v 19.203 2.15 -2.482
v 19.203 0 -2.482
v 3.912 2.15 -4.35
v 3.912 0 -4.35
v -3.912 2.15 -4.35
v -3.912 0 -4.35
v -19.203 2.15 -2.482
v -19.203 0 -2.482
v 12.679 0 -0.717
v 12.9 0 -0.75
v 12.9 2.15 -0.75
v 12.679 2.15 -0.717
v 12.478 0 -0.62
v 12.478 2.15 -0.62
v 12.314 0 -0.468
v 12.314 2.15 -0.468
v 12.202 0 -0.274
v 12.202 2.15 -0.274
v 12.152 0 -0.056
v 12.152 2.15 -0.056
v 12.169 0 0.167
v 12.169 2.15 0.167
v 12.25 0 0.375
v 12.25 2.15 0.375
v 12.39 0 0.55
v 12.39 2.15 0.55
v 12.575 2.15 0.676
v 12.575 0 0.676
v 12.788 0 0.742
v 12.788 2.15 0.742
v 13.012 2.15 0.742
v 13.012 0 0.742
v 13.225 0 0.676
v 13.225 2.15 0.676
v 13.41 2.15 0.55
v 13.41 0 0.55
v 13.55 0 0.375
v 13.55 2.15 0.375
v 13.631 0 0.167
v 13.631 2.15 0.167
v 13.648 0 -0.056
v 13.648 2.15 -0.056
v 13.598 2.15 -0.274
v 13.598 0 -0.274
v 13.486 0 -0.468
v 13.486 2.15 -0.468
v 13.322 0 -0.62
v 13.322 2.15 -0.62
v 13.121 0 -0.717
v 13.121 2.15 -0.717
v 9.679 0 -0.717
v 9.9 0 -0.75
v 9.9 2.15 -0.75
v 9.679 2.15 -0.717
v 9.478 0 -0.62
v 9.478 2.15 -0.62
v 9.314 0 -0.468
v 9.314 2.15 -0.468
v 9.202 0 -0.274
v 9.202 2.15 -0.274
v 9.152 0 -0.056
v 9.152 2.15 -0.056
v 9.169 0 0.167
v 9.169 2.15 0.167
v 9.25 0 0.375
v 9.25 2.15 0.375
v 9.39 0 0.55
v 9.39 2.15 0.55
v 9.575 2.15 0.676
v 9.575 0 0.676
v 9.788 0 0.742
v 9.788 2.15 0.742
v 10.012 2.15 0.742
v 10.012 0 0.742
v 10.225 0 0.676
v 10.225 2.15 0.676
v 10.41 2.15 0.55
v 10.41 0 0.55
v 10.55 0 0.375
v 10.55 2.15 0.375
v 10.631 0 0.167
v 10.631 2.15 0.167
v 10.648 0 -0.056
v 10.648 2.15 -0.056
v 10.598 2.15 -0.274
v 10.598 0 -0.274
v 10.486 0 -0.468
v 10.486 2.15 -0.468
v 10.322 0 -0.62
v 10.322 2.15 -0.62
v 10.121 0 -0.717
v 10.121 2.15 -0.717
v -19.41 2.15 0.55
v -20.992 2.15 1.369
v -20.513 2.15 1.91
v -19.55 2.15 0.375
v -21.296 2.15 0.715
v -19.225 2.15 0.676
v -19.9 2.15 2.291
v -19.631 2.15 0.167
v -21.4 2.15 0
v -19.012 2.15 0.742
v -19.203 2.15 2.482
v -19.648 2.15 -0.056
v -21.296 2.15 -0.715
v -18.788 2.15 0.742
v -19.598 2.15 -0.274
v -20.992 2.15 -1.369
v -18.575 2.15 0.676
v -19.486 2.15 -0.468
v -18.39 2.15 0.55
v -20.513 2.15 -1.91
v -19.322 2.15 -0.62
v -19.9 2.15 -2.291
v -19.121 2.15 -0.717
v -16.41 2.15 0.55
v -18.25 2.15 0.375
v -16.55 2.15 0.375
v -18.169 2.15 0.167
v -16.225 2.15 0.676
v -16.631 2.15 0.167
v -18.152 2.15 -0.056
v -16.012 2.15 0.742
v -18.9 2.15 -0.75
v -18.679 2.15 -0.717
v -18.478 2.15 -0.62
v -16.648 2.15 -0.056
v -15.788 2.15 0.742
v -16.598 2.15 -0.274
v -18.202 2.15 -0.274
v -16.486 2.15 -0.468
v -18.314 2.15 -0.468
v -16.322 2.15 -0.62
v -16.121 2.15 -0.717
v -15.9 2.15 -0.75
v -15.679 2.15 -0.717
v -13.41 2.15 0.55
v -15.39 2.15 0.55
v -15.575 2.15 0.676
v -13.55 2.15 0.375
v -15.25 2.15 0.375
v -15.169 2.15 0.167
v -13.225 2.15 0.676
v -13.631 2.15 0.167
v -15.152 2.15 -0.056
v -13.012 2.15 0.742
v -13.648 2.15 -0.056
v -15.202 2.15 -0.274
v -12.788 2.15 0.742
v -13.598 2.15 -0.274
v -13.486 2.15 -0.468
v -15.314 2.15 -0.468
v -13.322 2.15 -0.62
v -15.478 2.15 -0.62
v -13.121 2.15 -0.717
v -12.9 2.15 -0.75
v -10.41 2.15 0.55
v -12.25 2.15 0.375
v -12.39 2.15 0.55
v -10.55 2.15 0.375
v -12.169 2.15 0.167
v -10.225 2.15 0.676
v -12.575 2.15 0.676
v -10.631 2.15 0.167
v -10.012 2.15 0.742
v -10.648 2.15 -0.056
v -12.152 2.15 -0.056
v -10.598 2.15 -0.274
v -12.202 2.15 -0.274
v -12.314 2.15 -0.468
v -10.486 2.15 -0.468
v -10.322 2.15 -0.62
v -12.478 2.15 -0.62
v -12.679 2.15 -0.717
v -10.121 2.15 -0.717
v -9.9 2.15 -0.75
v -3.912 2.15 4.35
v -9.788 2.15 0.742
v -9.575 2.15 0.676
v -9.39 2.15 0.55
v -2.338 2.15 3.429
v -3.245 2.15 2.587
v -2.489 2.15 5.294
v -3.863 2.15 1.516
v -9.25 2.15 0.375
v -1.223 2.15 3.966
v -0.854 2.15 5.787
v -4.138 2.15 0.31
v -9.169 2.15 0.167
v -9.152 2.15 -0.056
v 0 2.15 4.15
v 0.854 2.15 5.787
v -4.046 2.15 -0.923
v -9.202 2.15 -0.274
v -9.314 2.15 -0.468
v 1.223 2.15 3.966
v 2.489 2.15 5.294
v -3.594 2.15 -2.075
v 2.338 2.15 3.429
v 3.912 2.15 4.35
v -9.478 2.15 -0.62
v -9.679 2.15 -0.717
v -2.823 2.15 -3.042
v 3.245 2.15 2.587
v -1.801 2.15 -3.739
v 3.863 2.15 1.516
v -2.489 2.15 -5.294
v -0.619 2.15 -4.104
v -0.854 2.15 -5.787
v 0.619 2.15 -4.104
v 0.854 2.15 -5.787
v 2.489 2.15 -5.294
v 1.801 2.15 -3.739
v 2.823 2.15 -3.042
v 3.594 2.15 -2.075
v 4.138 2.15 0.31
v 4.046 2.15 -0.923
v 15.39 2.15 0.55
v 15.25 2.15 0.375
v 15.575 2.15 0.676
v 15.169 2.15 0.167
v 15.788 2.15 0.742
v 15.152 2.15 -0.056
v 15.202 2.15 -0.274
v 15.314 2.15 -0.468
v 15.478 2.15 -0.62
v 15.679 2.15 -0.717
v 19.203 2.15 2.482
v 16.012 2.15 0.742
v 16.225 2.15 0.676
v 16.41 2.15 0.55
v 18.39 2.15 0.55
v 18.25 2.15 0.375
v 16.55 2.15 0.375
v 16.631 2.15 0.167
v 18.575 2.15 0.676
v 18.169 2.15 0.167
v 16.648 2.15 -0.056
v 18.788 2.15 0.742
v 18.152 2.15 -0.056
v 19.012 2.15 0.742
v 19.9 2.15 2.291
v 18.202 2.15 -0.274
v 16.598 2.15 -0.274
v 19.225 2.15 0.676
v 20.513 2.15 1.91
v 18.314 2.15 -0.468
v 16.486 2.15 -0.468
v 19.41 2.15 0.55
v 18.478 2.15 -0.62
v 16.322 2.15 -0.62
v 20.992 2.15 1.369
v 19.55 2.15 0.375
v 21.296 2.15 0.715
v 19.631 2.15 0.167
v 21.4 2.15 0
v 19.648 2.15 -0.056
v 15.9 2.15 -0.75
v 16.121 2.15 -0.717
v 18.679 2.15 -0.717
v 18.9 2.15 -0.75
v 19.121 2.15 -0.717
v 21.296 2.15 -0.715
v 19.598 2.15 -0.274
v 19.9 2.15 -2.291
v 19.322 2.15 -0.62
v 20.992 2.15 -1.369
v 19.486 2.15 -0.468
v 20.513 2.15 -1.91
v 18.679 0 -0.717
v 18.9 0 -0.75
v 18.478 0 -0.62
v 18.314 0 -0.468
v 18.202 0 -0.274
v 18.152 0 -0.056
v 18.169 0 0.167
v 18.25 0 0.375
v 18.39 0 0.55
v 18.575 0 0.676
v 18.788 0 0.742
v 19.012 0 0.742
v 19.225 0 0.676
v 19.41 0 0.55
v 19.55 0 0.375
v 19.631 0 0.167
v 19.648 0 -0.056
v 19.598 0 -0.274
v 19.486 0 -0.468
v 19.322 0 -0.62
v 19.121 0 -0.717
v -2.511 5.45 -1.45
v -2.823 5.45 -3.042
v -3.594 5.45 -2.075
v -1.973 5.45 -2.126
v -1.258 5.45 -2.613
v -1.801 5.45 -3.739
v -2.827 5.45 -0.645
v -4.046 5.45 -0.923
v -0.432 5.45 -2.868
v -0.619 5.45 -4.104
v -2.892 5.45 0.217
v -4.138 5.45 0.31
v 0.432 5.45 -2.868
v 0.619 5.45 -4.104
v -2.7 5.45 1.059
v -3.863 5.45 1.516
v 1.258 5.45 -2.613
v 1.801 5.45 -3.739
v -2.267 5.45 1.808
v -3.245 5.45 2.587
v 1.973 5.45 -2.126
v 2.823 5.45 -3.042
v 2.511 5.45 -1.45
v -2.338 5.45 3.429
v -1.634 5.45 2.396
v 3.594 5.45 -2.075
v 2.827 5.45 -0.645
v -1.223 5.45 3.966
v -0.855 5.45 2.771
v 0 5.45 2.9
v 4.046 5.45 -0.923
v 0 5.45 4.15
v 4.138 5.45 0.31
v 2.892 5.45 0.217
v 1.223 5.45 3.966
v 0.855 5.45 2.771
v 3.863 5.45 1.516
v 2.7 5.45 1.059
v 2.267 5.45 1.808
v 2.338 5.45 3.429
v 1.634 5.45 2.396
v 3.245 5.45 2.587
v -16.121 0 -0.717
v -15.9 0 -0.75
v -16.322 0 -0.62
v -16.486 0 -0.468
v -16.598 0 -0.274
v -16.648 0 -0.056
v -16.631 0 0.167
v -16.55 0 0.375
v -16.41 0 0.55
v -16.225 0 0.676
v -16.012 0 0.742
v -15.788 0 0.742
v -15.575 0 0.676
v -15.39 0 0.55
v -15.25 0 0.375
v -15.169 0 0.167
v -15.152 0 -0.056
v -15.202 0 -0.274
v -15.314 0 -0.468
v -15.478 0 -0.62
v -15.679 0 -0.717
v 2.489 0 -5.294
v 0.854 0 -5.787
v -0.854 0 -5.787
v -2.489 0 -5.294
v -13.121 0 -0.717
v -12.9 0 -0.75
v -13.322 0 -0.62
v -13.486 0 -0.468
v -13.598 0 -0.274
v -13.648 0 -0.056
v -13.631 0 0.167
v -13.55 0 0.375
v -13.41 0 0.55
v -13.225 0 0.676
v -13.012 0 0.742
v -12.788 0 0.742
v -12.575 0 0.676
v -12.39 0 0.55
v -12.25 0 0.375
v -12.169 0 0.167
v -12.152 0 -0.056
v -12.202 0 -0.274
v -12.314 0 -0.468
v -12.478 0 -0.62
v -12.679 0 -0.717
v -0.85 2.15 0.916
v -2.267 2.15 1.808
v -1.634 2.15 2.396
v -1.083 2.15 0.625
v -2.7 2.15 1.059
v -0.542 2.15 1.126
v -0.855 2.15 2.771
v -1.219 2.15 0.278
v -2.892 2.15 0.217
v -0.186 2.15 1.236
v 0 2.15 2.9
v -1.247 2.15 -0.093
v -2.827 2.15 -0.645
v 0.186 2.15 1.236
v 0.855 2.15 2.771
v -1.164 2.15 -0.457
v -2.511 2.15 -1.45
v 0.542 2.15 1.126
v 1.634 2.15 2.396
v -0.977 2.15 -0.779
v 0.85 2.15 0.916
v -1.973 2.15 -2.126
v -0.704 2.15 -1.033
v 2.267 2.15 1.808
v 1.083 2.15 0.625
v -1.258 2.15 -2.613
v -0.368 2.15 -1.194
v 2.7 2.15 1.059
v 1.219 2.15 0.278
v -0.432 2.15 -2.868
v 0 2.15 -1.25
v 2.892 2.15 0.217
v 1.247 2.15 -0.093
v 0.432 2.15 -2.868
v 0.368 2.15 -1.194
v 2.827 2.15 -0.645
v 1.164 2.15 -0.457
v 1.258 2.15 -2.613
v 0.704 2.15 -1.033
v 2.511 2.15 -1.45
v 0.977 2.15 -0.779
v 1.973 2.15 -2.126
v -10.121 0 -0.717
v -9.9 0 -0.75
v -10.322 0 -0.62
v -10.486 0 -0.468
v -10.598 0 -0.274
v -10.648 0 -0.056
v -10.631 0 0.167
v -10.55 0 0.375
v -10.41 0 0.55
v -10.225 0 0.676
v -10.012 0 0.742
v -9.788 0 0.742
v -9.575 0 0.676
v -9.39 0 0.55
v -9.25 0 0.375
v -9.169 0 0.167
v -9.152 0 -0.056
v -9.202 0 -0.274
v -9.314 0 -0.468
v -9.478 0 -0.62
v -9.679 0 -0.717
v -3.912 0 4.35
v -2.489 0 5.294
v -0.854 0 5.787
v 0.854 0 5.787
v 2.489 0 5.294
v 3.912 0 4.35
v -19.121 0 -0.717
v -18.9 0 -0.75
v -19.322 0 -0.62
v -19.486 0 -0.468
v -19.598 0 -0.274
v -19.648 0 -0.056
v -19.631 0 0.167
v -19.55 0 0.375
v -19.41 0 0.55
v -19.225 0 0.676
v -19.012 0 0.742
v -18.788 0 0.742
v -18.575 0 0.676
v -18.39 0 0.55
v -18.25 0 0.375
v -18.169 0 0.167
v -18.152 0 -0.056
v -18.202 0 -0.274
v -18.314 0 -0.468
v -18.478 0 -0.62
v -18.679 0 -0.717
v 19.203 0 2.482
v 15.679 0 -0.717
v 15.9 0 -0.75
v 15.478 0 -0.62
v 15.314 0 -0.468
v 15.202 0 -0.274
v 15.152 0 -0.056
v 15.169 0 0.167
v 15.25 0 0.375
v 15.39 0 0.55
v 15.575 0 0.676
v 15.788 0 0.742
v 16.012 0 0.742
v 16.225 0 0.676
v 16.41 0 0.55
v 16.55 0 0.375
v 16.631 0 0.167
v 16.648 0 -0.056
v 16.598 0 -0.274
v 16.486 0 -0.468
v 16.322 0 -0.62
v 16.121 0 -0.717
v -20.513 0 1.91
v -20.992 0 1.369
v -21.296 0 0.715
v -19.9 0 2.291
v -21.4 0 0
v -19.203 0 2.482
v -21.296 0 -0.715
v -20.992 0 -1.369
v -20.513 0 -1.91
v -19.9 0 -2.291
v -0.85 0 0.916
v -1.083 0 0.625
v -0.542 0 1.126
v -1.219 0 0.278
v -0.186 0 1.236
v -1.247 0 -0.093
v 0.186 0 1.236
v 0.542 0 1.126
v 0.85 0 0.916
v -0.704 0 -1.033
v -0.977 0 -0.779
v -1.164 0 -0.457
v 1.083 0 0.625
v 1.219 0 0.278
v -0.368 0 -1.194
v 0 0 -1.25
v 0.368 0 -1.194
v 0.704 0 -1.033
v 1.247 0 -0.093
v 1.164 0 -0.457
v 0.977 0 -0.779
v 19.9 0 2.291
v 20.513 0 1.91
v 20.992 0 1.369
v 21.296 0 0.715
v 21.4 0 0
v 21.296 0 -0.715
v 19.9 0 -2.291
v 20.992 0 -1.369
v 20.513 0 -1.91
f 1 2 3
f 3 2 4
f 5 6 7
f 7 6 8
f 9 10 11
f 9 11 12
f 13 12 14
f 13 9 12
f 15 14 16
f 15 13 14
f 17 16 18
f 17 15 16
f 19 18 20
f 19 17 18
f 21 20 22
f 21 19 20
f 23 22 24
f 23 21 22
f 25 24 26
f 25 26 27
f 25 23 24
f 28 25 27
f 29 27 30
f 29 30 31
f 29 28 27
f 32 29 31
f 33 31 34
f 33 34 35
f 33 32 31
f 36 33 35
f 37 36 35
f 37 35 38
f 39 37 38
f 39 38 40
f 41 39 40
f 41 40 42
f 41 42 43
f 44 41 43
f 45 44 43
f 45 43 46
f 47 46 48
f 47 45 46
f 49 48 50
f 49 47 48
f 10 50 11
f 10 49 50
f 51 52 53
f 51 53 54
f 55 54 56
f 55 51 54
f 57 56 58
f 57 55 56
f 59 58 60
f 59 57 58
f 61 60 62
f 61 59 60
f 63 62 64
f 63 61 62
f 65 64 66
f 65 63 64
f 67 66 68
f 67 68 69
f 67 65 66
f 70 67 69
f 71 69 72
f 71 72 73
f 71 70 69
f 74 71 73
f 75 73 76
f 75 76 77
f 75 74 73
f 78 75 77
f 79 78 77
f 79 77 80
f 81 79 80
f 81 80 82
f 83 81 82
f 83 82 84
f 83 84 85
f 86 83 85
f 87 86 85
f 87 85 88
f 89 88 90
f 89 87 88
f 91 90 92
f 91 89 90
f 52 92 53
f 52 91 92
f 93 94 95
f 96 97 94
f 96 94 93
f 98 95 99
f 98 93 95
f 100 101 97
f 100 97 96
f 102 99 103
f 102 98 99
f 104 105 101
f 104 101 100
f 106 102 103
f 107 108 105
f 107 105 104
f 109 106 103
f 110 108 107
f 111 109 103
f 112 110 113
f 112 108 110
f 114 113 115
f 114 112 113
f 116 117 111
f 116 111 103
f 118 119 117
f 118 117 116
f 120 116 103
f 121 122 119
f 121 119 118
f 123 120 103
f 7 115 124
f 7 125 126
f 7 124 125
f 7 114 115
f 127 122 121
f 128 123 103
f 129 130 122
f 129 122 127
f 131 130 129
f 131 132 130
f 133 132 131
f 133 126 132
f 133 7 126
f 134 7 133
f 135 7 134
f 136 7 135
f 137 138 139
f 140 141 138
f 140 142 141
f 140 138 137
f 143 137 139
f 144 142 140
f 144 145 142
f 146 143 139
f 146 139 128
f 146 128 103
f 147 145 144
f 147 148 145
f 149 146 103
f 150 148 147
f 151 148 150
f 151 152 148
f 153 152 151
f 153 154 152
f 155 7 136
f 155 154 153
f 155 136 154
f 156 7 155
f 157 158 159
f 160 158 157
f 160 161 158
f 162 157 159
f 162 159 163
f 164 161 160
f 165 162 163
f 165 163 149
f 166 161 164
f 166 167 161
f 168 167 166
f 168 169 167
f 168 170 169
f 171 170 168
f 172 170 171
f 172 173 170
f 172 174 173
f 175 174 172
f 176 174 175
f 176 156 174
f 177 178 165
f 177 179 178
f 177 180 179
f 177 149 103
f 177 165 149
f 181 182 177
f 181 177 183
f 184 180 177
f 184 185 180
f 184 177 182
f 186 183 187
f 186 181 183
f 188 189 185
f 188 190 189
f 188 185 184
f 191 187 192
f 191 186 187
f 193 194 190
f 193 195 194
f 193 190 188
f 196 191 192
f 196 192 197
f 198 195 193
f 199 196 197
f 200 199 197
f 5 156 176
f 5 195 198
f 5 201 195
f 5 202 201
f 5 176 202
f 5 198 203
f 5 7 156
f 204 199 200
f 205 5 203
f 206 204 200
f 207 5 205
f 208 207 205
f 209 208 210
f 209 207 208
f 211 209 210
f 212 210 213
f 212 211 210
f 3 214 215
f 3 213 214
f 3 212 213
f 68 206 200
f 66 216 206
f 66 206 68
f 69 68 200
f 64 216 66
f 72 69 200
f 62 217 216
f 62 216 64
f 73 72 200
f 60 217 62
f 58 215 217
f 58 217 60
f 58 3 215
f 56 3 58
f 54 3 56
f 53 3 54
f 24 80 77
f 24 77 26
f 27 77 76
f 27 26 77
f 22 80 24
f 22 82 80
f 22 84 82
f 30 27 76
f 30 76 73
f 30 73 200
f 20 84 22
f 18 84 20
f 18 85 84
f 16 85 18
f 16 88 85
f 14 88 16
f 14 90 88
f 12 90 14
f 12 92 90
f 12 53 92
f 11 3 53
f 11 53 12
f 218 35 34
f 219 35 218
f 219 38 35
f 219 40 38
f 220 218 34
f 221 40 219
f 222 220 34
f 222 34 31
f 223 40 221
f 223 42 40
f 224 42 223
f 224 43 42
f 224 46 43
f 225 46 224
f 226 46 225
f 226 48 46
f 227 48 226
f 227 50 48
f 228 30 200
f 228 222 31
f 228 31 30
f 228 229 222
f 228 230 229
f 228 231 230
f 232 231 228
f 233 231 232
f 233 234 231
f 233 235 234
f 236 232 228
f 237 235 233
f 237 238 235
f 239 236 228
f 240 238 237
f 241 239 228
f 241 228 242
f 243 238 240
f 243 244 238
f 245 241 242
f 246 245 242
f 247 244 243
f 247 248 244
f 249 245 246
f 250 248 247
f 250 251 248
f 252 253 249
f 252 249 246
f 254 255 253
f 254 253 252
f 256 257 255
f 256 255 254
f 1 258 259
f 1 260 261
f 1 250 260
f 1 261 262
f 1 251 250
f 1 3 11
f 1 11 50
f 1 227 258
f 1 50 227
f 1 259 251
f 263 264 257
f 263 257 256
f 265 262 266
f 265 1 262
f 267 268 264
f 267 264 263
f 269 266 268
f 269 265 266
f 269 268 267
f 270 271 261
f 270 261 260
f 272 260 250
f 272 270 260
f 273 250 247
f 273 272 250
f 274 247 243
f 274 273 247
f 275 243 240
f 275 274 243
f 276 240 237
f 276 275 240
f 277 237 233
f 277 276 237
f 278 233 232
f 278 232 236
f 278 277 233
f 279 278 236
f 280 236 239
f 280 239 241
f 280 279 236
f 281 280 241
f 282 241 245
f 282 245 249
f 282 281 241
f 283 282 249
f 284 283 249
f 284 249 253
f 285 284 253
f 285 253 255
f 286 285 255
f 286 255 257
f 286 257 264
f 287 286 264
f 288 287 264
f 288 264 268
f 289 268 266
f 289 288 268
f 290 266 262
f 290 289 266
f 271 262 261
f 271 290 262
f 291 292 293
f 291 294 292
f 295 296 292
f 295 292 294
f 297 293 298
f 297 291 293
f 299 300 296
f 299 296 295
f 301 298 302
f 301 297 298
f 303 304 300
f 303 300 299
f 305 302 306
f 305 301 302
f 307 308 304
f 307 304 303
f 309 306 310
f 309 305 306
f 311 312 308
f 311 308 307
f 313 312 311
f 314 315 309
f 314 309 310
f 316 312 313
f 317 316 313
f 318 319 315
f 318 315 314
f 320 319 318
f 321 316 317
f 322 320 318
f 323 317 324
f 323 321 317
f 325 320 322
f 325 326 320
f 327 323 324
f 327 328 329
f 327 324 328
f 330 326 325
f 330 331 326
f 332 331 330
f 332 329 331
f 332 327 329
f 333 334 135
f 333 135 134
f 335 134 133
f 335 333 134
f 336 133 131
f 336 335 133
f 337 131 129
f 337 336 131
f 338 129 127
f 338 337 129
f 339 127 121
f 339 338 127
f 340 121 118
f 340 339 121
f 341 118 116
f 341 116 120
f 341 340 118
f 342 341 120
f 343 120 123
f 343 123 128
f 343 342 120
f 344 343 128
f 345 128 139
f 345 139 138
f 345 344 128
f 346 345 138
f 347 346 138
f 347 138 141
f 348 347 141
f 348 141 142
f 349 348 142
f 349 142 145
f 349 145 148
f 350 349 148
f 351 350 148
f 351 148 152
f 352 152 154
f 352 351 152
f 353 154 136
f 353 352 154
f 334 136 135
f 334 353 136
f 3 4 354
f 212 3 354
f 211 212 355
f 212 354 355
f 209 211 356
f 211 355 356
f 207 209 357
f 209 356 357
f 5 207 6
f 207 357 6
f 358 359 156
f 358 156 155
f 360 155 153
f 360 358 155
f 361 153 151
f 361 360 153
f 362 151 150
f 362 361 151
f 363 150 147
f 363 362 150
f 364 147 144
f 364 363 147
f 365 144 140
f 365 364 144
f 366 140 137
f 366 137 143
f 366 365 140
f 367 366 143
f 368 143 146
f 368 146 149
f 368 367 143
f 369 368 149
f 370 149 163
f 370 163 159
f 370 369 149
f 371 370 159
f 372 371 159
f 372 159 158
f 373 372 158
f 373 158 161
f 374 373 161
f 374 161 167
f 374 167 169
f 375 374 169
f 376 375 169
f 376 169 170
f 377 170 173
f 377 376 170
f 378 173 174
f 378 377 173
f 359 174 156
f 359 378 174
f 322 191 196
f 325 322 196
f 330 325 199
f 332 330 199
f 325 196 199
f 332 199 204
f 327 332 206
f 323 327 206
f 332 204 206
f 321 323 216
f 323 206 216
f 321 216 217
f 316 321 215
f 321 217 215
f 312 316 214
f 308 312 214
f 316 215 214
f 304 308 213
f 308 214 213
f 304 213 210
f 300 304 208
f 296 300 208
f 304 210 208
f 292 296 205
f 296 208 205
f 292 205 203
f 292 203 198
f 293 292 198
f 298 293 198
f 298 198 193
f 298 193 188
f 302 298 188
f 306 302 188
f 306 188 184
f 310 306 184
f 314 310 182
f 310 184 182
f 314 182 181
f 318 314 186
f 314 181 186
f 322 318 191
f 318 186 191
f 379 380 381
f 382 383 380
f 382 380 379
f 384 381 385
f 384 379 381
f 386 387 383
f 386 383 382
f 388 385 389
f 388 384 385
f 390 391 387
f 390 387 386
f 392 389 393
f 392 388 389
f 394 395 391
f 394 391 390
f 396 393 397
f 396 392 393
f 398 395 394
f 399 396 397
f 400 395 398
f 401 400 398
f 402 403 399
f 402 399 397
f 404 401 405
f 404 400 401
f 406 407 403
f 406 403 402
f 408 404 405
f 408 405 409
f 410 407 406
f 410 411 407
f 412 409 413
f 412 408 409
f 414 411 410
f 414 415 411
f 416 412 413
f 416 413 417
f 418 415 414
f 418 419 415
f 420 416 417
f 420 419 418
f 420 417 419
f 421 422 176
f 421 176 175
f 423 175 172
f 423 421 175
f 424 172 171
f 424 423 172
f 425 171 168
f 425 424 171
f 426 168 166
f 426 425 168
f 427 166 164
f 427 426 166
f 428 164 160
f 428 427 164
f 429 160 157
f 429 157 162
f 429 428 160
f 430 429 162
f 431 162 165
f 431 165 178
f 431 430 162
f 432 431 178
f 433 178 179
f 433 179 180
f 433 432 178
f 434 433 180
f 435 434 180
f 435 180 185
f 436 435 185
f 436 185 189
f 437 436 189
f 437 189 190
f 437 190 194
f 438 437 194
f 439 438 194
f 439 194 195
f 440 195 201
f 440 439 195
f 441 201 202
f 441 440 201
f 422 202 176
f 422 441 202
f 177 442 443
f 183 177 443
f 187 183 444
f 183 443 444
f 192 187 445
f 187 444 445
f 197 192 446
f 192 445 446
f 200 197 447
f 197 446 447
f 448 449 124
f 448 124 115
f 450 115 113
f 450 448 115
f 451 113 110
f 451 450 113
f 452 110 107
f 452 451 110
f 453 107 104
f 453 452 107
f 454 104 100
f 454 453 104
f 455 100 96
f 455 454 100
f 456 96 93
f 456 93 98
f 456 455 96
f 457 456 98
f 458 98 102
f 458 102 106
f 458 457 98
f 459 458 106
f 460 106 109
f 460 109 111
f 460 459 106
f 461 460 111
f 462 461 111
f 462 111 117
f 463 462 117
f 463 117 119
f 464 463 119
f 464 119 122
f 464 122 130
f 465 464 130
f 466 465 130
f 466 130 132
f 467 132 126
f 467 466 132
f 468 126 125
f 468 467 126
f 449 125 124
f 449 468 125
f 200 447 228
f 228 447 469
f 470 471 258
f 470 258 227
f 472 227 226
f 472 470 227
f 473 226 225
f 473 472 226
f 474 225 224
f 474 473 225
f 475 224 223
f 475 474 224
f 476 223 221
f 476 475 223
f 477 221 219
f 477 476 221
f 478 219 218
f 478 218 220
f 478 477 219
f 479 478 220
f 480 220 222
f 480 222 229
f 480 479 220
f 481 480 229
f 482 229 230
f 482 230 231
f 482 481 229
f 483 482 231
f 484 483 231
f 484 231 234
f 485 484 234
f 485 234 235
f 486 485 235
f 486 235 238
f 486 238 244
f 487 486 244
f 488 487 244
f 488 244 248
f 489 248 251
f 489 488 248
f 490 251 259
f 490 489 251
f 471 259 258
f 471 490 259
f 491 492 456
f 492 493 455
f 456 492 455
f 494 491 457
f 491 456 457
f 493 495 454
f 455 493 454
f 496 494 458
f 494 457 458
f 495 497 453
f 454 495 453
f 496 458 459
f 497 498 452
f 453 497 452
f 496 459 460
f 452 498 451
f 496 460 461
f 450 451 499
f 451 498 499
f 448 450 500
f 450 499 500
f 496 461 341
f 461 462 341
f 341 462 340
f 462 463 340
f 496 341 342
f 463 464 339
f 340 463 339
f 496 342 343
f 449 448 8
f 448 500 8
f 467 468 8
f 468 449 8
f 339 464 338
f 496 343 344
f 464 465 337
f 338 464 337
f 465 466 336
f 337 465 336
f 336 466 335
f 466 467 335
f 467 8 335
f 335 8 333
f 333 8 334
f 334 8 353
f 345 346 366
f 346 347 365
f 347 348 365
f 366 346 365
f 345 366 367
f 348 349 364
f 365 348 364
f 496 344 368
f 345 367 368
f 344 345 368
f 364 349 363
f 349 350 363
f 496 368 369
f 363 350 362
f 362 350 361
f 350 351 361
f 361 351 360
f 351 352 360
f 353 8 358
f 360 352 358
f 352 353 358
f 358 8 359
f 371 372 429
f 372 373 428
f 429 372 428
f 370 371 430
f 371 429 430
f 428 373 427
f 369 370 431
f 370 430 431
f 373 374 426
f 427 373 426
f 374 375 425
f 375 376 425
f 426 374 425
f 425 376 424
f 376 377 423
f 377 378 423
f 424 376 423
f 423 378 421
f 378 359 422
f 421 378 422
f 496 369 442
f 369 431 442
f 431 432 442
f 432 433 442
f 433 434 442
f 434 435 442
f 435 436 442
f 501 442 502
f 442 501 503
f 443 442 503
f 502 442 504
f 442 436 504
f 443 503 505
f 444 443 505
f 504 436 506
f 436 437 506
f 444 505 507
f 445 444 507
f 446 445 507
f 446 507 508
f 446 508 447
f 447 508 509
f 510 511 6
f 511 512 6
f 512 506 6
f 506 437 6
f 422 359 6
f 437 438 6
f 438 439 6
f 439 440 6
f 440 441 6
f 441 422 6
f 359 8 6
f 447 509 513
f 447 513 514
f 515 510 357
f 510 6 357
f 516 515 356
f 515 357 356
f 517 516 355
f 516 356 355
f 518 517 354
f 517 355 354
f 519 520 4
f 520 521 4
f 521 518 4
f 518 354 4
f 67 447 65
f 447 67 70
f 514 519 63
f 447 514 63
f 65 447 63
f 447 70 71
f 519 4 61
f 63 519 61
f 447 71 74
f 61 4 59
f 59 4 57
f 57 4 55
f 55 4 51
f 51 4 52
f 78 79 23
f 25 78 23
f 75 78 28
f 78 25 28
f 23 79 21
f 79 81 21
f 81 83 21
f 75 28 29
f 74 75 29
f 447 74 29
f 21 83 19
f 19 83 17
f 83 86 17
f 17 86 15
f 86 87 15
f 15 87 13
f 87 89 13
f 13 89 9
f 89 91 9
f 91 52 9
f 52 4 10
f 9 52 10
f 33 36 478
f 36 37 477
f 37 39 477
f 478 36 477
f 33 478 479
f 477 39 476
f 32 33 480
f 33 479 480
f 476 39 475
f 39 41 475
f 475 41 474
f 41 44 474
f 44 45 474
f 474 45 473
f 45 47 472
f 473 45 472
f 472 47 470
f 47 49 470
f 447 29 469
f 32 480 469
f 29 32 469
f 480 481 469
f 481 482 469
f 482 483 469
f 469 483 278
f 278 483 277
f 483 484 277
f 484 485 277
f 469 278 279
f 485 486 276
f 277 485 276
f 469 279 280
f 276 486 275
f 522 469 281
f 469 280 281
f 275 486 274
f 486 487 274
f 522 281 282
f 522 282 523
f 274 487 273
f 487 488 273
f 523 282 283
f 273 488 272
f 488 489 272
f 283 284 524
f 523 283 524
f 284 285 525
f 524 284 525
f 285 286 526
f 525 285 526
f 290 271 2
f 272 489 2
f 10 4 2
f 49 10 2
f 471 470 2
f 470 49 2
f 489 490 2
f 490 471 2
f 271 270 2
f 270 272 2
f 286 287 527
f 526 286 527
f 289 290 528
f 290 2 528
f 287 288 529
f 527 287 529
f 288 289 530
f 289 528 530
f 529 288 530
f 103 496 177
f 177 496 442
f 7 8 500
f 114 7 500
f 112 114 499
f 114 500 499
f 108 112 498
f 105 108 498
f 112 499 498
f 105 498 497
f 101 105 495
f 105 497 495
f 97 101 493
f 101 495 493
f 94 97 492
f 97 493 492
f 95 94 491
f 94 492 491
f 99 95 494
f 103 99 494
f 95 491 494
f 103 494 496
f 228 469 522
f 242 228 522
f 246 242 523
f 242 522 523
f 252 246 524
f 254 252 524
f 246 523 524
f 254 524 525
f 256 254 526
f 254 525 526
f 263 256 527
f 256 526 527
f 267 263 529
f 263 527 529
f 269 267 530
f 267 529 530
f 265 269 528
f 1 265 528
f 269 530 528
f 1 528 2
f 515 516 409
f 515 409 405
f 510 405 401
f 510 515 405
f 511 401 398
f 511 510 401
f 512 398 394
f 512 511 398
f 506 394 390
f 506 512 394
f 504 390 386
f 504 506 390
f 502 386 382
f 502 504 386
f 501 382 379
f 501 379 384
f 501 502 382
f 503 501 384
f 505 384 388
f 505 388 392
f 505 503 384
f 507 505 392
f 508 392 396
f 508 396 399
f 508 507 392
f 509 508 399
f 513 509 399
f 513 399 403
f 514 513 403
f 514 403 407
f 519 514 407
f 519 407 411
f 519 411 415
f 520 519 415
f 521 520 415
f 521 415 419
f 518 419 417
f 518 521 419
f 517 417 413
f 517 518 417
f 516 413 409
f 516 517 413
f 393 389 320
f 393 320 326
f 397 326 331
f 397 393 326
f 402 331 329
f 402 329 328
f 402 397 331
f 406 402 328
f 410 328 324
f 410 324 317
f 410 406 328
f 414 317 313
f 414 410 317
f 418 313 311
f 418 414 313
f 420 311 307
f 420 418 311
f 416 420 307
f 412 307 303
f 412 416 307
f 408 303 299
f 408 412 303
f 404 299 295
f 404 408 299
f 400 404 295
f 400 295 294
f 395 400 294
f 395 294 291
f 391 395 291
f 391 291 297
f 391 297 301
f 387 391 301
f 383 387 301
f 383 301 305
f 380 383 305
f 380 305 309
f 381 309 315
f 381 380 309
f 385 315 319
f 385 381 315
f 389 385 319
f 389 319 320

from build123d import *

# Parameters (mm, degrees)
SKETCH1_R           = 5.85
SKETCH1_R_2         = 1.25
SKETCH1_R_3         = 0.75
BOSS_EXTRUDE1_DEPTH = 2.15
SKETCH2_R           = 4.15
SKETCH2_R_2         = 2.9
BOSS_EXTRUDE2_DEPTH = 3.3


with BuildPart() as part:
    # Sketch1 → Boss-Extrude1 (new body)
    # profile 1 of 3: a face of its own
    with BuildSketch(Plane(origin=(0, 0, 0), x_dir=(1, 0, 0), z_dir=(0, 1, 0))):
        Circle(SKETCH1_R)
        with Locations(Location((0, 0, 0), (0, 0, 90))):
            Circle(SKETCH1_R_2, mode=Mode.SUBTRACT)
    # profile 2 of 3: a face of its own
    with BuildSketch(Plane(origin=(0, 0, 0), x_dir=(1, 0, 0), z_dir=(0, 1, 0))):
        with BuildLine():
            Line((-3.911521443, 4.35), (-19.203214028, 2.481544127))
            ThreePointArc((-19.203214028, 2.481544127), (-21.4, 0), (-19.203214028, -2.481544127))
            Line((-19.203214028, -2.481544127), (-3.911521443, -4.35))
            ThreePointArc((-3.911521443, -4.35), (-5.85, 0), (-3.911521443, 4.35))
        make_face()
        with Locations(Location((-18.9, 0, 0), (0, 0, 90))):
            Circle(SKETCH1_R_3, mode=Mode.SUBTRACT)
        with Locations(Location((-15.9, 0, 0), (0, 0, 90))):
            Circle(SKETCH1_R_3, mode=Mode.SUBTRACT)
        with Locations(Location((-12.9, 0, 0), (0, 0, 90))):
            Circle(SKETCH1_R_3, mode=Mode.SUBTRACT)
        with Locations(Location((-9.9, 0, 0), (0, 0, 90))):
            Circle(SKETCH1_R_3, mode=Mode.SUBTRACT)
    # profile 3 of 3: a face of its own
    with BuildSketch(Plane(origin=(0, 0, 0), x_dir=(1, 0, 0), z_dir=(0, 1, 0))):
        with BuildLine():
            Line((19.203214028, 2.481544127), (3.911521443, 4.35))
            ThreePointArc((3.911521443, 4.35), (5.343449281, 2.381186633), (5.85, 0))
            ThreePointArc((5.85, 0), (5.343449281, -2.381186633), (3.911521443, -4.35))
            Line((3.911521443, -4.35), (19.203214028, -2.481544127))
            ThreePointArc((19.203214028, -2.481544127), (21.4, 0), (19.203214028, 2.481544127))
        make_face()
        with Locations(Location((9.9, 0, 0), (0, 0, 90))):
            Circle(SKETCH1_R_3, mode=Mode.SUBTRACT)
        with Locations(Location((12.9, 0, 0), (0, 0, 90))):
            Circle(SKETCH1_R_3, mode=Mode.SUBTRACT)
        with Locations(Location((15.9, 0, 0), (0, 0, 90))):
            Circle(SKETCH1_R_3, mode=Mode.SUBTRACT)
        with Locations(Location((18.9, 0, 0), (0, 0, 90))):
            Circle(SKETCH1_R_3, mode=Mode.SUBTRACT)
    extrude(amount=BOSS_EXTRUDE1_DEPTH)

    # Sketch2 → Boss-Extrude2 (add)
    with BuildSketch(Plane(origin=(0, 2.15, 0), x_dir=(1, 0, 0), z_dir=(0, 1, 0))):
        with Locations(Location((0, 0, 0), (0, 0, 270))):
            Circle(SKETCH2_R)
        with Locations(Location((0, 0, 0), (0, 0, 270))):
            Circle(SKETCH2_R_2, mode=Mode.SUBTRACT)
    extrude(amount=BOSS_EXTRUDE2_DEPTH)


solid = part.part
